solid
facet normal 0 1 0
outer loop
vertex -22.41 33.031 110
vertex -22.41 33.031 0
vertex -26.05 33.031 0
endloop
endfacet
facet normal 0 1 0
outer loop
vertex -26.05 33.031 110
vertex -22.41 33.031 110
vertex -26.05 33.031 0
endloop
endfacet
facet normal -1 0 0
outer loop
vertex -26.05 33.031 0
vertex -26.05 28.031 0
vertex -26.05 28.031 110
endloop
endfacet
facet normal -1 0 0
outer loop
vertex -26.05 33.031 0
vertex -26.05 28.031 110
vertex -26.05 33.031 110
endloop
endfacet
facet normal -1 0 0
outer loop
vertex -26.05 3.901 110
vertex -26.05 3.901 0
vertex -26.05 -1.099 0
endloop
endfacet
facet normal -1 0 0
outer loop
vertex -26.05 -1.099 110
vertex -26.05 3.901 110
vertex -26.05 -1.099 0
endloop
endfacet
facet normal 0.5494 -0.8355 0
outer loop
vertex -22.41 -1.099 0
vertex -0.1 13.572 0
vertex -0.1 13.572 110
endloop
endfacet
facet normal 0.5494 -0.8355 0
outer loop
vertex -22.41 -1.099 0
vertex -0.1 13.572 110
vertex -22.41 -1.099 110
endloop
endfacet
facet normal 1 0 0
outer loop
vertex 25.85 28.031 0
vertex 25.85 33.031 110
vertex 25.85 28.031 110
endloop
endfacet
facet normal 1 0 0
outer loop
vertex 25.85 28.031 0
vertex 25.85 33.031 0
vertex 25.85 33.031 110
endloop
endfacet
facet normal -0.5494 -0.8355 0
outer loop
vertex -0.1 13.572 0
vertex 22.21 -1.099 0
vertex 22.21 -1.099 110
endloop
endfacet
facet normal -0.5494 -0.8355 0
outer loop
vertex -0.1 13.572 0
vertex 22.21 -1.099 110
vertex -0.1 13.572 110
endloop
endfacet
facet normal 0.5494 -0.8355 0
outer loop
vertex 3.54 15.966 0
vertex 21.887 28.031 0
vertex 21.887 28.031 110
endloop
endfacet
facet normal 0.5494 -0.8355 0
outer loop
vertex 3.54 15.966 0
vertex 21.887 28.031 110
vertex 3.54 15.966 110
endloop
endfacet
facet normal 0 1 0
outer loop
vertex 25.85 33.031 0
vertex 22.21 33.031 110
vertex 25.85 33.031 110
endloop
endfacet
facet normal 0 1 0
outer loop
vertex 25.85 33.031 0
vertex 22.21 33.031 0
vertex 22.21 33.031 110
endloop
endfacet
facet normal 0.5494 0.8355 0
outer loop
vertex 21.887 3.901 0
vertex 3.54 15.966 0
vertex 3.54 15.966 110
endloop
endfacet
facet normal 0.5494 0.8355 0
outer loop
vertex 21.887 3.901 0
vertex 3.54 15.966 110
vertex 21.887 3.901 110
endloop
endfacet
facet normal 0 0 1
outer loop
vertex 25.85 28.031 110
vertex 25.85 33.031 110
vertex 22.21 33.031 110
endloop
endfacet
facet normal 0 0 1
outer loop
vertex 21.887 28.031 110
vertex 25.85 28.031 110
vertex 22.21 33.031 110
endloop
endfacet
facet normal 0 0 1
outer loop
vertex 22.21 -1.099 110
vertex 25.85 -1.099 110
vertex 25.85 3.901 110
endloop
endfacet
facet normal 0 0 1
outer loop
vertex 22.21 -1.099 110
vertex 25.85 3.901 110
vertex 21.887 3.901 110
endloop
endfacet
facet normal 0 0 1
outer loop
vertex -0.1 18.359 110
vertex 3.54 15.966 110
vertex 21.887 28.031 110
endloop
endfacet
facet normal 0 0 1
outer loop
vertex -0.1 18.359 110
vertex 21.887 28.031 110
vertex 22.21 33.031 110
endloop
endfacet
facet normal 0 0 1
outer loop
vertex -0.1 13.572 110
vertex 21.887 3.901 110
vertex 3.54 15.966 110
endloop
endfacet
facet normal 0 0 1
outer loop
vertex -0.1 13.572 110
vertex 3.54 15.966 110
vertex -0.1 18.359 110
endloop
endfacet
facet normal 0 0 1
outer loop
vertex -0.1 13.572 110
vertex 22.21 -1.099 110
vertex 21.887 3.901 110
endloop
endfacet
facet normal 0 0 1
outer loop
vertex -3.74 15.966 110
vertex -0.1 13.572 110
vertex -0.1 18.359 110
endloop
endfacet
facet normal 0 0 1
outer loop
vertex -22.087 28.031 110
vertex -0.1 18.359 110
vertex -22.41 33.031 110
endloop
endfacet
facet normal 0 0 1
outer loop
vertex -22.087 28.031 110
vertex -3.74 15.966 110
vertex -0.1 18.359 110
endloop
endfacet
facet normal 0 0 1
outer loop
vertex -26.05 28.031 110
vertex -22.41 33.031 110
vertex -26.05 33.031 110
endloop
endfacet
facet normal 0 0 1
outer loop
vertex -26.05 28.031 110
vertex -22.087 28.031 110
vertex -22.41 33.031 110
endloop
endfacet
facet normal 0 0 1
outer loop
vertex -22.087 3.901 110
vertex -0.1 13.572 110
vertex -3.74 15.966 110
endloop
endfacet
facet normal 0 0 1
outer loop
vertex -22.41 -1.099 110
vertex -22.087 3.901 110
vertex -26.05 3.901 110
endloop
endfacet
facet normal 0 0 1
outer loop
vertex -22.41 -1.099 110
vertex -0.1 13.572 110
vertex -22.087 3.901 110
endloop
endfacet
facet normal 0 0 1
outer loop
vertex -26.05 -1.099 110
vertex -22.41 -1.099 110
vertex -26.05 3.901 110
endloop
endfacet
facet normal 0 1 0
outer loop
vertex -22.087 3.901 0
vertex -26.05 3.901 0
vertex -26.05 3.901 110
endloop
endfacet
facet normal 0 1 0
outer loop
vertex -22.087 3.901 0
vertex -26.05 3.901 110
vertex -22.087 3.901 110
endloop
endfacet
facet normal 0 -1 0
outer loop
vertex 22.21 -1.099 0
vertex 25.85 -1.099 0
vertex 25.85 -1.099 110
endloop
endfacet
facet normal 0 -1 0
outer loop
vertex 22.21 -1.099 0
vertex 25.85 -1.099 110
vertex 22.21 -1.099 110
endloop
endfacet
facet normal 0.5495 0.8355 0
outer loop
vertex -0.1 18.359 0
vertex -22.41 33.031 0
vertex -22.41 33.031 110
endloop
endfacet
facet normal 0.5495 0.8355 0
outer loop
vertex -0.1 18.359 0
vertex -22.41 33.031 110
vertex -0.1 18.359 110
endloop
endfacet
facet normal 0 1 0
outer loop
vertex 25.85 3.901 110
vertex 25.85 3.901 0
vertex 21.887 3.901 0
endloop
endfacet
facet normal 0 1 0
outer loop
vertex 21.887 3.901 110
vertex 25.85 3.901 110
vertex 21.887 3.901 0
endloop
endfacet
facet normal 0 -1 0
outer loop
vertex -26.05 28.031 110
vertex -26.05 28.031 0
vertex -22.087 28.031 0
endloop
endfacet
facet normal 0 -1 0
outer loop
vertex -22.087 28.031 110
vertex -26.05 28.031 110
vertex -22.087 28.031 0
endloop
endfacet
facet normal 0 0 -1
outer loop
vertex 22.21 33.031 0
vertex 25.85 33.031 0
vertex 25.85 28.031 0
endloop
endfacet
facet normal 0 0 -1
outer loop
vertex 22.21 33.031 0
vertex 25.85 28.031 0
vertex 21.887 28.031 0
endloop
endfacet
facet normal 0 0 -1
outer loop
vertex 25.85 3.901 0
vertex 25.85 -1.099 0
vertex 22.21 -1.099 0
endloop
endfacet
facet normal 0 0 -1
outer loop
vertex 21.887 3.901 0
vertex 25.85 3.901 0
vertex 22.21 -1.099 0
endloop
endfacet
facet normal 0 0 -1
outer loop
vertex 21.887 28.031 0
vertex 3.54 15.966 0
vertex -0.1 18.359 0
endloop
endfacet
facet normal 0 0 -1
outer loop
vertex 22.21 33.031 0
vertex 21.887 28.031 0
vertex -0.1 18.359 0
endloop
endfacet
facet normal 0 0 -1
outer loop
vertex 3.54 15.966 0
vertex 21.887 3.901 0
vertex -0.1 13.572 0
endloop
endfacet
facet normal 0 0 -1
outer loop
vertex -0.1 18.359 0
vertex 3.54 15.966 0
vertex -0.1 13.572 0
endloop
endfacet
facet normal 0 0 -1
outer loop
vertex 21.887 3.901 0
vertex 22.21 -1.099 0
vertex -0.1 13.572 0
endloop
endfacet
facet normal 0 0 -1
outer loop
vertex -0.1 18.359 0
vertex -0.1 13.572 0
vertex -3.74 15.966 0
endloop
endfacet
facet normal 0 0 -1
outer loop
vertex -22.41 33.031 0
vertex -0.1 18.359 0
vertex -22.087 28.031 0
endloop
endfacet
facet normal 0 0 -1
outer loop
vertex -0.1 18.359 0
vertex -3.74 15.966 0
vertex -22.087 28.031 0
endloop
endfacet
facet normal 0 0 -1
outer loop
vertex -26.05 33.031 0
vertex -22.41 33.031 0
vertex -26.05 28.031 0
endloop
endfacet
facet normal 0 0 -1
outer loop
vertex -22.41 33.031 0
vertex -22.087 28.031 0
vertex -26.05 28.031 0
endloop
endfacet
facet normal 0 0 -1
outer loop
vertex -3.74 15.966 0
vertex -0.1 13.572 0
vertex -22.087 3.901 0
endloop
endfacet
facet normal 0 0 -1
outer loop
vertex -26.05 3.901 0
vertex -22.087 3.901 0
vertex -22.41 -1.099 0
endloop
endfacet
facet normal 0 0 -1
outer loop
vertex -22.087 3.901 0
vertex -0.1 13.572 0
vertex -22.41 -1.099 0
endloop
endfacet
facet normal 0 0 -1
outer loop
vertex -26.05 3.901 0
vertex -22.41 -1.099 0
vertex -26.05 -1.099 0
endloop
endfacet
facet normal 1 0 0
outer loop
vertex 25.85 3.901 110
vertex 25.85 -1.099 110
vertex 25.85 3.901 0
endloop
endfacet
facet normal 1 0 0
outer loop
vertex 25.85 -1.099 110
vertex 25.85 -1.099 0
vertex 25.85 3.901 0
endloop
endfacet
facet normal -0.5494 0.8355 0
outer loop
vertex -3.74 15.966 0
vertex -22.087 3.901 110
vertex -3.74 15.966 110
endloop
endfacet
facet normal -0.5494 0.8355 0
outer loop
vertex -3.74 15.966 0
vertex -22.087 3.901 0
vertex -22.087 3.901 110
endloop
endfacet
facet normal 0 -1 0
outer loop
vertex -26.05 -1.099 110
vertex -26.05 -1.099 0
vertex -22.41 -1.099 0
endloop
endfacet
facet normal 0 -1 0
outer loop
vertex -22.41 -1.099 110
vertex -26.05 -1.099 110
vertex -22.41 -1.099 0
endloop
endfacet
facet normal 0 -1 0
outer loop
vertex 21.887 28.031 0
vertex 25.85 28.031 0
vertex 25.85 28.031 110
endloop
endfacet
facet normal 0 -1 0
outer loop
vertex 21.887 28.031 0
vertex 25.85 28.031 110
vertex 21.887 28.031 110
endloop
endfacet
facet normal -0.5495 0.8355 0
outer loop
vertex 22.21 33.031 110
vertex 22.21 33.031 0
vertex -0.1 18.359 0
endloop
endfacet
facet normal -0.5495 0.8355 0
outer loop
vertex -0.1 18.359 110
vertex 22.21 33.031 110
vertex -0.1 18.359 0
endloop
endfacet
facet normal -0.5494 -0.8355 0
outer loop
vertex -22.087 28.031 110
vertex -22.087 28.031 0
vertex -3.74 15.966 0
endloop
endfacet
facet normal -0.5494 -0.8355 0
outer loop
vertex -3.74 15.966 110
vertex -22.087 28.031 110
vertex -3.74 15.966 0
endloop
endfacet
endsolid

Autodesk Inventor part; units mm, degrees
ref_plane "YZ Plane" through (0, 0, 0) normal (1, 0, 0) x (0, 1, 0)
ref_plane "XZ Plane" through (0, 0, 0) normal (0, 1, 0) x (-1, 0, 0)
ref_plane "XY Plane" through (0, 0, 0) normal (0, 0, 1) x (1, 0, 0)
sketch "Sketch1" plane through (0, 0, 0) normal (0, 0, 1) x (1, 0, 0)
  line L0 (25.85, -1.5771) -> (25.85, -14.5436) construction
  line L1 (25.85, 20.3743) -> (25.85, 33.3441) construction
  line L2 (-26.05, 20.3743) -> (-26.05, 33.3441) construction
  line L3 (-26.05, -1.5771) -> (-26.05, -14.5436) construction
  line L4 (25.85, 20.3743) -> (25.85, 33.3441) construction
  point P0 (0, 0)
ref_plane "Work Plane1" through (25.85, 33.3441, 0) normal (0, 0, 1) x (-1, 0, 0)
sketch "Sketch4" plane through (25.85, 33.3441, 0) normal (0, 0, 1) x (-1, 0, 0)
  line L0 (65.2627, -3.6865) -> (0, -3.6865) construction
  line L1 (55.9, 41.8613) -> (55.9, -3.6865) construction
  line L2 (55.9, -3.6865) -> (0, -3.6865) construction
  line L3 (0, 34.4434) -> (51.9, 0.3135) construction
  line L4 (51.9, 34.4434) -> (0, 0.3135) construction
  line L5 (50.8011, 36.1145) -> (-1.0989, 1.9846) construction
  line L6 (52.9989, 32.7724) -> (1.0989, -1.3575) construction
  line L7 (1.0989, 36.1145) -> (52.9989, 1.9846) construction
  line L8 (-1.0989, 32.7724) -> (50.8011, -1.3575) construction
  line L9 (0, 0.3135) -> (51.9, 0.3135) construction
  line L10 (51.9, 0.3135) -> (51.9, 34.4434) construction
  line L11 (51.9, 34.4434) -> (0, 34.4434) construction
  line L12 (0, 34.4434) -> (0, 0.3135) construction
  line L13 (0, 34.4434) -> (0, 29.4434) construction
  line L14 (0, 34.4434) -> (5, 34.4434) construction
  line L15 (0, 29.4434) -> (3.9633, 29.4434)
  line L16 (0, 0.3135) -> (0, 5.3135) construction
  line L17 (0, 0.3135) -> (5, 0.3135) construction
  line L18 (51.9, 0.3135) -> (51.9, 5.3135) construction
  line L19 (51.9, 0.3135) -> (56.9, 0.3135) construction
  line L20 (51.9, 34.4434) -> (51.9, 29.4434) construction
  line L21 (51.9, 34.4434) -> (56.9, 34.4434) construction
  line L22 (51.9, 29.4434) -> (47.9367, 29.4434)
  line L23 (3.9633, 5.3135) -> (22.31, 17.3785)
  line L24 (47.9367, 5.3135) -> (29.59, 17.3785)
  line L25 (47.9367, 29.4434) -> (29.59, 17.3785)
  line L26 (3.64, 34.4434) -> (25.95, 19.7722)
  line L27 (25.95, 19.7722) -> (48.26, 34.4434)
  line L28 (3.64, 0.3135) -> (25.95, 14.9848)
  line L29 (48.26, 0.3135) -> (25.95, 14.9848)
  line L30 (22.31, 17.3785) -> (3.9633, 29.4434)
  line L31 (51.9, 5.3135) -> (51.9, 0.3135)
  line L32 (51.9, 29.4434) -> (51.9, 34.4434)
  line L33 (0, 5.3135) -> (3.9633, 5.3135)
  line L34 (51.9, 5.3135) -> (47.9367, 5.3135)
  line L35 (51.9, 34.4434) -> (48.26, 34.4434)
  line L36 (0, 34.4434) -> (3.64, 34.4434)
  line L37 (0, 34.4434) -> (0, 29.4434)
  line L38 (3.64, 0.3135) -> (0, 0.3135)
  line L39 (48.26, 0.3135) -> (51.9, 0.3135)
  line L40 (0, 0.3135) -> (0, 5.3135)
  point P0 (25.85, 33.3441)
  point P1 (25.95, 17.3785)
  dimension "d17" = 2
  dimension "d18" = 2
  dimension "d19" = 2
  dimension "d20" = 2
  dimension "d21" = 5
  dimension "d22" = 90
  dimension "d23" = 5
  dimension "d24" = 90
  dimension "d25" = 5
  dimension "d26" = 90
  dimension "d27" = 5
  dimension "d28" = 90
extrude "Extrusion1" add sketch "Sketch4" along normal blind 110
